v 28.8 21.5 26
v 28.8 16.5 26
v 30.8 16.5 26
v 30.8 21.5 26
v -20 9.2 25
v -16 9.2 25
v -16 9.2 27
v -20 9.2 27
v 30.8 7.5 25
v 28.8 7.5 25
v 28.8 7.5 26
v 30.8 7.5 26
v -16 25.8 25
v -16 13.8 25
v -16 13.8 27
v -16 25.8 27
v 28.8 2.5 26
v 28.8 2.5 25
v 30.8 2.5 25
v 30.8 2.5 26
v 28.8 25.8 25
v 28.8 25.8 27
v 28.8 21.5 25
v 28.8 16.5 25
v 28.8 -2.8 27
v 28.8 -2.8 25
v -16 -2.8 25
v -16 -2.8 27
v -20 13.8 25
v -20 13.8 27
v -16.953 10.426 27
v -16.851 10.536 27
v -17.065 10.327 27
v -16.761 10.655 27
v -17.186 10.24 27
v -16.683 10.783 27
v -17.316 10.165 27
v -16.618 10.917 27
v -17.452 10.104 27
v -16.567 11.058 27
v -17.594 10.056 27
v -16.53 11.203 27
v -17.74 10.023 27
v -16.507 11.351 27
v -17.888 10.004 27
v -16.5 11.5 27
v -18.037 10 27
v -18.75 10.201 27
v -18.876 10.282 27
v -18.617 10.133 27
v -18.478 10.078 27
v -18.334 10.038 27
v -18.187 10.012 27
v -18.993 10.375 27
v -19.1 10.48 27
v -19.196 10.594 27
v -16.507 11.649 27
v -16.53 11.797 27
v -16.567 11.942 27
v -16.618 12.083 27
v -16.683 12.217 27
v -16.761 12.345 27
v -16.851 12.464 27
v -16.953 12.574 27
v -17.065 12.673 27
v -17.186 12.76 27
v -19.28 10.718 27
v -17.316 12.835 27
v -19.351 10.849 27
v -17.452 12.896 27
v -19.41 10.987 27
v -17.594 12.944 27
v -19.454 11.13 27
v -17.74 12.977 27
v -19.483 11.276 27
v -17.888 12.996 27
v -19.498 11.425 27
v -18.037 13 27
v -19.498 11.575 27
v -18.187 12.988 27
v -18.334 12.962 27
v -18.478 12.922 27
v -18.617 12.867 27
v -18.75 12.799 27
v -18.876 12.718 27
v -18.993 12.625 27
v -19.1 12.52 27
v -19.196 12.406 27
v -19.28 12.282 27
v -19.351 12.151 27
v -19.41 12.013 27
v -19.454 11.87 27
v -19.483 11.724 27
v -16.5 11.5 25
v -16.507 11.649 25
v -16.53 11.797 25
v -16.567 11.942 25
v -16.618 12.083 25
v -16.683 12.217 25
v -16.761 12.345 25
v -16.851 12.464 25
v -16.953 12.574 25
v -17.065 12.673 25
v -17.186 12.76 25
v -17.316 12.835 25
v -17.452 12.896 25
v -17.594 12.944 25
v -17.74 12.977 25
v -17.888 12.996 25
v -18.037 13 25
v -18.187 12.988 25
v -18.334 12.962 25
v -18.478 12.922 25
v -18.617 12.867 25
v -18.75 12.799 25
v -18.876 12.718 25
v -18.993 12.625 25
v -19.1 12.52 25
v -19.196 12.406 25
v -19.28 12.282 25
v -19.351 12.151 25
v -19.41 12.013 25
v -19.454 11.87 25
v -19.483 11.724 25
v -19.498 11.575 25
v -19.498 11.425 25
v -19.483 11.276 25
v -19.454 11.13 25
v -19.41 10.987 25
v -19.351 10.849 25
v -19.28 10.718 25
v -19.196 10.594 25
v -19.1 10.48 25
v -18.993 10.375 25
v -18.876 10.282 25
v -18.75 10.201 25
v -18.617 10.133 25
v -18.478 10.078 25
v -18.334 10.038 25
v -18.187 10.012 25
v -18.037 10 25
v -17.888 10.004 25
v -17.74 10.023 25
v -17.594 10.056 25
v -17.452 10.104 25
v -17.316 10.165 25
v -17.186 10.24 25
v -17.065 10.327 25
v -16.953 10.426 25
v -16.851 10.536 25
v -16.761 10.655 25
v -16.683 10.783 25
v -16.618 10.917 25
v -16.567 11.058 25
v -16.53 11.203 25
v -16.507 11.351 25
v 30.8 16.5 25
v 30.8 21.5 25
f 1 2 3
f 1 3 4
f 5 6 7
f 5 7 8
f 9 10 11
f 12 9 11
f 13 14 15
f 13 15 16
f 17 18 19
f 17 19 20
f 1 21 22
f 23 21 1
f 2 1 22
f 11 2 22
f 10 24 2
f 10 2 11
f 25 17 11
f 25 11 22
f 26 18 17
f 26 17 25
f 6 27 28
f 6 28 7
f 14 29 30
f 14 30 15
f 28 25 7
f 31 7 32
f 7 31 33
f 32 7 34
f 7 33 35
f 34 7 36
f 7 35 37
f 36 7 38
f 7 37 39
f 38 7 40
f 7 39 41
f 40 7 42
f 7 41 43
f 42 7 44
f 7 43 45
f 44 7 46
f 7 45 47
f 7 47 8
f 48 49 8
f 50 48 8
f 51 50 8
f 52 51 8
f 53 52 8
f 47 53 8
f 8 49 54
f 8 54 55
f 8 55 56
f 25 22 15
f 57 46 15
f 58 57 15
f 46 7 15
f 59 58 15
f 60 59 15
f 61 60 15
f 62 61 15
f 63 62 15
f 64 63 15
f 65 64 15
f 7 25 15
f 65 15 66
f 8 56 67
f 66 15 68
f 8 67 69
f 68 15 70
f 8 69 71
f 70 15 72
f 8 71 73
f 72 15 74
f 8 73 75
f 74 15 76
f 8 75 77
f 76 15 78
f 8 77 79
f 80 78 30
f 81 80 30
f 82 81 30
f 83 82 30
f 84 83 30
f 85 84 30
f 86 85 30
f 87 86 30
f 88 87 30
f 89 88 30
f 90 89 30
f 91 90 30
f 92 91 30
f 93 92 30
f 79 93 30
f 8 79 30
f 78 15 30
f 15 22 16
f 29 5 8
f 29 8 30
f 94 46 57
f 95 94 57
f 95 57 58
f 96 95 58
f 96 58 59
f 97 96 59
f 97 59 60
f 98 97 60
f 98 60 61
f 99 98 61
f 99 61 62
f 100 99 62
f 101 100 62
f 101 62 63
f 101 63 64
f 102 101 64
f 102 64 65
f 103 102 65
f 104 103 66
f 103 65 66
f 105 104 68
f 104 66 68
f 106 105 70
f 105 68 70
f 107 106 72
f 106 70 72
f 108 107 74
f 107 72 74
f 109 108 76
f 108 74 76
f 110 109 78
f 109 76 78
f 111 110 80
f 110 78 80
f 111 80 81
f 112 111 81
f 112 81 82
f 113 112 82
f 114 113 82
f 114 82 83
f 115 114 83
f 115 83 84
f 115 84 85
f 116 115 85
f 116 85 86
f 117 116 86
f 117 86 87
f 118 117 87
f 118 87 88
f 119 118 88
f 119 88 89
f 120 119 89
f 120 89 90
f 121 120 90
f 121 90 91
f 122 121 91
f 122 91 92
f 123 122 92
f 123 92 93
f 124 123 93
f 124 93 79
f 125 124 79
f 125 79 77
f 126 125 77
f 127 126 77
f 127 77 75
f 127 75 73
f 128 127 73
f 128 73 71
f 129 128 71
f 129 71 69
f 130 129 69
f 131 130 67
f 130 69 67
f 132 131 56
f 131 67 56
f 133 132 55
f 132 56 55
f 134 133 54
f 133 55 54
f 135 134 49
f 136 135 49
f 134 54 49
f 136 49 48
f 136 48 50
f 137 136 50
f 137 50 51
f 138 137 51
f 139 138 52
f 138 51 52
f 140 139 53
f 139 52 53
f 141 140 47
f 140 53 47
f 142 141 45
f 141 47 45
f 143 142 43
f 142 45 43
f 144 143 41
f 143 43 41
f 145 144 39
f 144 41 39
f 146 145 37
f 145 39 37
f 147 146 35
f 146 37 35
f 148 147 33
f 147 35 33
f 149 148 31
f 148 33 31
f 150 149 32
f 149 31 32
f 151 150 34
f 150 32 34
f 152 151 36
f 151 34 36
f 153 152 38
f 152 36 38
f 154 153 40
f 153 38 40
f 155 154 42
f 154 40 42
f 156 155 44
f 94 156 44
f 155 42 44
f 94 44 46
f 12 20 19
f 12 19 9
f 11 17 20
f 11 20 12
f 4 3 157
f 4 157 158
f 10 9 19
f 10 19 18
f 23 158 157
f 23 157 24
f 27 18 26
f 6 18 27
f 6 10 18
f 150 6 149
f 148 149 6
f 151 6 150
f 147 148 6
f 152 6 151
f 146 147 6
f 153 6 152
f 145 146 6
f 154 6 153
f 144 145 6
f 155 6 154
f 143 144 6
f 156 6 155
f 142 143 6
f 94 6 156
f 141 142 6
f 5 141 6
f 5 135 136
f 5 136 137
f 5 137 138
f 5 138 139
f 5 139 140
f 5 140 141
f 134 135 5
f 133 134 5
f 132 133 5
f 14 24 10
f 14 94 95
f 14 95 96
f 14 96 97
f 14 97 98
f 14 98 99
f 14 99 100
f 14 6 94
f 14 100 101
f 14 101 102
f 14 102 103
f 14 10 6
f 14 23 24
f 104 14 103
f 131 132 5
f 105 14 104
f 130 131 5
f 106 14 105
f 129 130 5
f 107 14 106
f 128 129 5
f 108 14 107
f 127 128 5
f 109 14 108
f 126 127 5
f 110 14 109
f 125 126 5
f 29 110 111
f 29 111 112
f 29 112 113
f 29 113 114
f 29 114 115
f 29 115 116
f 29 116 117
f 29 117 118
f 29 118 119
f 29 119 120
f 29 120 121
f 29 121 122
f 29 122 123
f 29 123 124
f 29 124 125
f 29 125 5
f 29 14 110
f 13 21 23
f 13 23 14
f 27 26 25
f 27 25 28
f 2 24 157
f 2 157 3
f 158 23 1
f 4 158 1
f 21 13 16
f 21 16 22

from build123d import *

# Parameters (mm, degrees)
PAD003_DEPTH    = 2
SKETCH011_R     = 1.5
POCKET007_DEPTH = 5
SKETCH012_W     = 5
SKETCH012_H     = 1
PAD004_DEPTH    = 2


with BuildPart() as part:
    # Sketch010 → Pad003 (new body)
    with BuildSketch(Plane.XY.offset(25)):
        Polygon((-16, 25.8), (28.8, 25.8), (28.8, -2.8), (-16, -2.8), (-16, 9.2), (-20, 9.2), (-20, 13.8), (-16, 13.8), align=None)
    extrude(amount=PAD003_DEPTH)

    # Sketch011 (on Face10 of Pad003) → Pocket007 (cut)
    with BuildSketch(Plane.XY.offset(27)):
        with Locations((-18, 11.5)):
            Circle(SKETCH011_R)
    extrude(amount=-POCKET007_DEPTH, mode=Mode.SUBTRACT)

    # Sketch012 (on Face3 of Pocket007) → Pad004 (join)
    with BuildSketch(Plane.YZ.offset(28.8)):
        with Locations((5, 25.5)):
            Rectangle(SKETCH012_W, SKETCH012_H)
        with Locations((19, 25.5)):
            Rectangle(SKETCH012_W, SKETCH012_H)
    extrude(amount=PAD004_DEPTH)


solid = part.part
